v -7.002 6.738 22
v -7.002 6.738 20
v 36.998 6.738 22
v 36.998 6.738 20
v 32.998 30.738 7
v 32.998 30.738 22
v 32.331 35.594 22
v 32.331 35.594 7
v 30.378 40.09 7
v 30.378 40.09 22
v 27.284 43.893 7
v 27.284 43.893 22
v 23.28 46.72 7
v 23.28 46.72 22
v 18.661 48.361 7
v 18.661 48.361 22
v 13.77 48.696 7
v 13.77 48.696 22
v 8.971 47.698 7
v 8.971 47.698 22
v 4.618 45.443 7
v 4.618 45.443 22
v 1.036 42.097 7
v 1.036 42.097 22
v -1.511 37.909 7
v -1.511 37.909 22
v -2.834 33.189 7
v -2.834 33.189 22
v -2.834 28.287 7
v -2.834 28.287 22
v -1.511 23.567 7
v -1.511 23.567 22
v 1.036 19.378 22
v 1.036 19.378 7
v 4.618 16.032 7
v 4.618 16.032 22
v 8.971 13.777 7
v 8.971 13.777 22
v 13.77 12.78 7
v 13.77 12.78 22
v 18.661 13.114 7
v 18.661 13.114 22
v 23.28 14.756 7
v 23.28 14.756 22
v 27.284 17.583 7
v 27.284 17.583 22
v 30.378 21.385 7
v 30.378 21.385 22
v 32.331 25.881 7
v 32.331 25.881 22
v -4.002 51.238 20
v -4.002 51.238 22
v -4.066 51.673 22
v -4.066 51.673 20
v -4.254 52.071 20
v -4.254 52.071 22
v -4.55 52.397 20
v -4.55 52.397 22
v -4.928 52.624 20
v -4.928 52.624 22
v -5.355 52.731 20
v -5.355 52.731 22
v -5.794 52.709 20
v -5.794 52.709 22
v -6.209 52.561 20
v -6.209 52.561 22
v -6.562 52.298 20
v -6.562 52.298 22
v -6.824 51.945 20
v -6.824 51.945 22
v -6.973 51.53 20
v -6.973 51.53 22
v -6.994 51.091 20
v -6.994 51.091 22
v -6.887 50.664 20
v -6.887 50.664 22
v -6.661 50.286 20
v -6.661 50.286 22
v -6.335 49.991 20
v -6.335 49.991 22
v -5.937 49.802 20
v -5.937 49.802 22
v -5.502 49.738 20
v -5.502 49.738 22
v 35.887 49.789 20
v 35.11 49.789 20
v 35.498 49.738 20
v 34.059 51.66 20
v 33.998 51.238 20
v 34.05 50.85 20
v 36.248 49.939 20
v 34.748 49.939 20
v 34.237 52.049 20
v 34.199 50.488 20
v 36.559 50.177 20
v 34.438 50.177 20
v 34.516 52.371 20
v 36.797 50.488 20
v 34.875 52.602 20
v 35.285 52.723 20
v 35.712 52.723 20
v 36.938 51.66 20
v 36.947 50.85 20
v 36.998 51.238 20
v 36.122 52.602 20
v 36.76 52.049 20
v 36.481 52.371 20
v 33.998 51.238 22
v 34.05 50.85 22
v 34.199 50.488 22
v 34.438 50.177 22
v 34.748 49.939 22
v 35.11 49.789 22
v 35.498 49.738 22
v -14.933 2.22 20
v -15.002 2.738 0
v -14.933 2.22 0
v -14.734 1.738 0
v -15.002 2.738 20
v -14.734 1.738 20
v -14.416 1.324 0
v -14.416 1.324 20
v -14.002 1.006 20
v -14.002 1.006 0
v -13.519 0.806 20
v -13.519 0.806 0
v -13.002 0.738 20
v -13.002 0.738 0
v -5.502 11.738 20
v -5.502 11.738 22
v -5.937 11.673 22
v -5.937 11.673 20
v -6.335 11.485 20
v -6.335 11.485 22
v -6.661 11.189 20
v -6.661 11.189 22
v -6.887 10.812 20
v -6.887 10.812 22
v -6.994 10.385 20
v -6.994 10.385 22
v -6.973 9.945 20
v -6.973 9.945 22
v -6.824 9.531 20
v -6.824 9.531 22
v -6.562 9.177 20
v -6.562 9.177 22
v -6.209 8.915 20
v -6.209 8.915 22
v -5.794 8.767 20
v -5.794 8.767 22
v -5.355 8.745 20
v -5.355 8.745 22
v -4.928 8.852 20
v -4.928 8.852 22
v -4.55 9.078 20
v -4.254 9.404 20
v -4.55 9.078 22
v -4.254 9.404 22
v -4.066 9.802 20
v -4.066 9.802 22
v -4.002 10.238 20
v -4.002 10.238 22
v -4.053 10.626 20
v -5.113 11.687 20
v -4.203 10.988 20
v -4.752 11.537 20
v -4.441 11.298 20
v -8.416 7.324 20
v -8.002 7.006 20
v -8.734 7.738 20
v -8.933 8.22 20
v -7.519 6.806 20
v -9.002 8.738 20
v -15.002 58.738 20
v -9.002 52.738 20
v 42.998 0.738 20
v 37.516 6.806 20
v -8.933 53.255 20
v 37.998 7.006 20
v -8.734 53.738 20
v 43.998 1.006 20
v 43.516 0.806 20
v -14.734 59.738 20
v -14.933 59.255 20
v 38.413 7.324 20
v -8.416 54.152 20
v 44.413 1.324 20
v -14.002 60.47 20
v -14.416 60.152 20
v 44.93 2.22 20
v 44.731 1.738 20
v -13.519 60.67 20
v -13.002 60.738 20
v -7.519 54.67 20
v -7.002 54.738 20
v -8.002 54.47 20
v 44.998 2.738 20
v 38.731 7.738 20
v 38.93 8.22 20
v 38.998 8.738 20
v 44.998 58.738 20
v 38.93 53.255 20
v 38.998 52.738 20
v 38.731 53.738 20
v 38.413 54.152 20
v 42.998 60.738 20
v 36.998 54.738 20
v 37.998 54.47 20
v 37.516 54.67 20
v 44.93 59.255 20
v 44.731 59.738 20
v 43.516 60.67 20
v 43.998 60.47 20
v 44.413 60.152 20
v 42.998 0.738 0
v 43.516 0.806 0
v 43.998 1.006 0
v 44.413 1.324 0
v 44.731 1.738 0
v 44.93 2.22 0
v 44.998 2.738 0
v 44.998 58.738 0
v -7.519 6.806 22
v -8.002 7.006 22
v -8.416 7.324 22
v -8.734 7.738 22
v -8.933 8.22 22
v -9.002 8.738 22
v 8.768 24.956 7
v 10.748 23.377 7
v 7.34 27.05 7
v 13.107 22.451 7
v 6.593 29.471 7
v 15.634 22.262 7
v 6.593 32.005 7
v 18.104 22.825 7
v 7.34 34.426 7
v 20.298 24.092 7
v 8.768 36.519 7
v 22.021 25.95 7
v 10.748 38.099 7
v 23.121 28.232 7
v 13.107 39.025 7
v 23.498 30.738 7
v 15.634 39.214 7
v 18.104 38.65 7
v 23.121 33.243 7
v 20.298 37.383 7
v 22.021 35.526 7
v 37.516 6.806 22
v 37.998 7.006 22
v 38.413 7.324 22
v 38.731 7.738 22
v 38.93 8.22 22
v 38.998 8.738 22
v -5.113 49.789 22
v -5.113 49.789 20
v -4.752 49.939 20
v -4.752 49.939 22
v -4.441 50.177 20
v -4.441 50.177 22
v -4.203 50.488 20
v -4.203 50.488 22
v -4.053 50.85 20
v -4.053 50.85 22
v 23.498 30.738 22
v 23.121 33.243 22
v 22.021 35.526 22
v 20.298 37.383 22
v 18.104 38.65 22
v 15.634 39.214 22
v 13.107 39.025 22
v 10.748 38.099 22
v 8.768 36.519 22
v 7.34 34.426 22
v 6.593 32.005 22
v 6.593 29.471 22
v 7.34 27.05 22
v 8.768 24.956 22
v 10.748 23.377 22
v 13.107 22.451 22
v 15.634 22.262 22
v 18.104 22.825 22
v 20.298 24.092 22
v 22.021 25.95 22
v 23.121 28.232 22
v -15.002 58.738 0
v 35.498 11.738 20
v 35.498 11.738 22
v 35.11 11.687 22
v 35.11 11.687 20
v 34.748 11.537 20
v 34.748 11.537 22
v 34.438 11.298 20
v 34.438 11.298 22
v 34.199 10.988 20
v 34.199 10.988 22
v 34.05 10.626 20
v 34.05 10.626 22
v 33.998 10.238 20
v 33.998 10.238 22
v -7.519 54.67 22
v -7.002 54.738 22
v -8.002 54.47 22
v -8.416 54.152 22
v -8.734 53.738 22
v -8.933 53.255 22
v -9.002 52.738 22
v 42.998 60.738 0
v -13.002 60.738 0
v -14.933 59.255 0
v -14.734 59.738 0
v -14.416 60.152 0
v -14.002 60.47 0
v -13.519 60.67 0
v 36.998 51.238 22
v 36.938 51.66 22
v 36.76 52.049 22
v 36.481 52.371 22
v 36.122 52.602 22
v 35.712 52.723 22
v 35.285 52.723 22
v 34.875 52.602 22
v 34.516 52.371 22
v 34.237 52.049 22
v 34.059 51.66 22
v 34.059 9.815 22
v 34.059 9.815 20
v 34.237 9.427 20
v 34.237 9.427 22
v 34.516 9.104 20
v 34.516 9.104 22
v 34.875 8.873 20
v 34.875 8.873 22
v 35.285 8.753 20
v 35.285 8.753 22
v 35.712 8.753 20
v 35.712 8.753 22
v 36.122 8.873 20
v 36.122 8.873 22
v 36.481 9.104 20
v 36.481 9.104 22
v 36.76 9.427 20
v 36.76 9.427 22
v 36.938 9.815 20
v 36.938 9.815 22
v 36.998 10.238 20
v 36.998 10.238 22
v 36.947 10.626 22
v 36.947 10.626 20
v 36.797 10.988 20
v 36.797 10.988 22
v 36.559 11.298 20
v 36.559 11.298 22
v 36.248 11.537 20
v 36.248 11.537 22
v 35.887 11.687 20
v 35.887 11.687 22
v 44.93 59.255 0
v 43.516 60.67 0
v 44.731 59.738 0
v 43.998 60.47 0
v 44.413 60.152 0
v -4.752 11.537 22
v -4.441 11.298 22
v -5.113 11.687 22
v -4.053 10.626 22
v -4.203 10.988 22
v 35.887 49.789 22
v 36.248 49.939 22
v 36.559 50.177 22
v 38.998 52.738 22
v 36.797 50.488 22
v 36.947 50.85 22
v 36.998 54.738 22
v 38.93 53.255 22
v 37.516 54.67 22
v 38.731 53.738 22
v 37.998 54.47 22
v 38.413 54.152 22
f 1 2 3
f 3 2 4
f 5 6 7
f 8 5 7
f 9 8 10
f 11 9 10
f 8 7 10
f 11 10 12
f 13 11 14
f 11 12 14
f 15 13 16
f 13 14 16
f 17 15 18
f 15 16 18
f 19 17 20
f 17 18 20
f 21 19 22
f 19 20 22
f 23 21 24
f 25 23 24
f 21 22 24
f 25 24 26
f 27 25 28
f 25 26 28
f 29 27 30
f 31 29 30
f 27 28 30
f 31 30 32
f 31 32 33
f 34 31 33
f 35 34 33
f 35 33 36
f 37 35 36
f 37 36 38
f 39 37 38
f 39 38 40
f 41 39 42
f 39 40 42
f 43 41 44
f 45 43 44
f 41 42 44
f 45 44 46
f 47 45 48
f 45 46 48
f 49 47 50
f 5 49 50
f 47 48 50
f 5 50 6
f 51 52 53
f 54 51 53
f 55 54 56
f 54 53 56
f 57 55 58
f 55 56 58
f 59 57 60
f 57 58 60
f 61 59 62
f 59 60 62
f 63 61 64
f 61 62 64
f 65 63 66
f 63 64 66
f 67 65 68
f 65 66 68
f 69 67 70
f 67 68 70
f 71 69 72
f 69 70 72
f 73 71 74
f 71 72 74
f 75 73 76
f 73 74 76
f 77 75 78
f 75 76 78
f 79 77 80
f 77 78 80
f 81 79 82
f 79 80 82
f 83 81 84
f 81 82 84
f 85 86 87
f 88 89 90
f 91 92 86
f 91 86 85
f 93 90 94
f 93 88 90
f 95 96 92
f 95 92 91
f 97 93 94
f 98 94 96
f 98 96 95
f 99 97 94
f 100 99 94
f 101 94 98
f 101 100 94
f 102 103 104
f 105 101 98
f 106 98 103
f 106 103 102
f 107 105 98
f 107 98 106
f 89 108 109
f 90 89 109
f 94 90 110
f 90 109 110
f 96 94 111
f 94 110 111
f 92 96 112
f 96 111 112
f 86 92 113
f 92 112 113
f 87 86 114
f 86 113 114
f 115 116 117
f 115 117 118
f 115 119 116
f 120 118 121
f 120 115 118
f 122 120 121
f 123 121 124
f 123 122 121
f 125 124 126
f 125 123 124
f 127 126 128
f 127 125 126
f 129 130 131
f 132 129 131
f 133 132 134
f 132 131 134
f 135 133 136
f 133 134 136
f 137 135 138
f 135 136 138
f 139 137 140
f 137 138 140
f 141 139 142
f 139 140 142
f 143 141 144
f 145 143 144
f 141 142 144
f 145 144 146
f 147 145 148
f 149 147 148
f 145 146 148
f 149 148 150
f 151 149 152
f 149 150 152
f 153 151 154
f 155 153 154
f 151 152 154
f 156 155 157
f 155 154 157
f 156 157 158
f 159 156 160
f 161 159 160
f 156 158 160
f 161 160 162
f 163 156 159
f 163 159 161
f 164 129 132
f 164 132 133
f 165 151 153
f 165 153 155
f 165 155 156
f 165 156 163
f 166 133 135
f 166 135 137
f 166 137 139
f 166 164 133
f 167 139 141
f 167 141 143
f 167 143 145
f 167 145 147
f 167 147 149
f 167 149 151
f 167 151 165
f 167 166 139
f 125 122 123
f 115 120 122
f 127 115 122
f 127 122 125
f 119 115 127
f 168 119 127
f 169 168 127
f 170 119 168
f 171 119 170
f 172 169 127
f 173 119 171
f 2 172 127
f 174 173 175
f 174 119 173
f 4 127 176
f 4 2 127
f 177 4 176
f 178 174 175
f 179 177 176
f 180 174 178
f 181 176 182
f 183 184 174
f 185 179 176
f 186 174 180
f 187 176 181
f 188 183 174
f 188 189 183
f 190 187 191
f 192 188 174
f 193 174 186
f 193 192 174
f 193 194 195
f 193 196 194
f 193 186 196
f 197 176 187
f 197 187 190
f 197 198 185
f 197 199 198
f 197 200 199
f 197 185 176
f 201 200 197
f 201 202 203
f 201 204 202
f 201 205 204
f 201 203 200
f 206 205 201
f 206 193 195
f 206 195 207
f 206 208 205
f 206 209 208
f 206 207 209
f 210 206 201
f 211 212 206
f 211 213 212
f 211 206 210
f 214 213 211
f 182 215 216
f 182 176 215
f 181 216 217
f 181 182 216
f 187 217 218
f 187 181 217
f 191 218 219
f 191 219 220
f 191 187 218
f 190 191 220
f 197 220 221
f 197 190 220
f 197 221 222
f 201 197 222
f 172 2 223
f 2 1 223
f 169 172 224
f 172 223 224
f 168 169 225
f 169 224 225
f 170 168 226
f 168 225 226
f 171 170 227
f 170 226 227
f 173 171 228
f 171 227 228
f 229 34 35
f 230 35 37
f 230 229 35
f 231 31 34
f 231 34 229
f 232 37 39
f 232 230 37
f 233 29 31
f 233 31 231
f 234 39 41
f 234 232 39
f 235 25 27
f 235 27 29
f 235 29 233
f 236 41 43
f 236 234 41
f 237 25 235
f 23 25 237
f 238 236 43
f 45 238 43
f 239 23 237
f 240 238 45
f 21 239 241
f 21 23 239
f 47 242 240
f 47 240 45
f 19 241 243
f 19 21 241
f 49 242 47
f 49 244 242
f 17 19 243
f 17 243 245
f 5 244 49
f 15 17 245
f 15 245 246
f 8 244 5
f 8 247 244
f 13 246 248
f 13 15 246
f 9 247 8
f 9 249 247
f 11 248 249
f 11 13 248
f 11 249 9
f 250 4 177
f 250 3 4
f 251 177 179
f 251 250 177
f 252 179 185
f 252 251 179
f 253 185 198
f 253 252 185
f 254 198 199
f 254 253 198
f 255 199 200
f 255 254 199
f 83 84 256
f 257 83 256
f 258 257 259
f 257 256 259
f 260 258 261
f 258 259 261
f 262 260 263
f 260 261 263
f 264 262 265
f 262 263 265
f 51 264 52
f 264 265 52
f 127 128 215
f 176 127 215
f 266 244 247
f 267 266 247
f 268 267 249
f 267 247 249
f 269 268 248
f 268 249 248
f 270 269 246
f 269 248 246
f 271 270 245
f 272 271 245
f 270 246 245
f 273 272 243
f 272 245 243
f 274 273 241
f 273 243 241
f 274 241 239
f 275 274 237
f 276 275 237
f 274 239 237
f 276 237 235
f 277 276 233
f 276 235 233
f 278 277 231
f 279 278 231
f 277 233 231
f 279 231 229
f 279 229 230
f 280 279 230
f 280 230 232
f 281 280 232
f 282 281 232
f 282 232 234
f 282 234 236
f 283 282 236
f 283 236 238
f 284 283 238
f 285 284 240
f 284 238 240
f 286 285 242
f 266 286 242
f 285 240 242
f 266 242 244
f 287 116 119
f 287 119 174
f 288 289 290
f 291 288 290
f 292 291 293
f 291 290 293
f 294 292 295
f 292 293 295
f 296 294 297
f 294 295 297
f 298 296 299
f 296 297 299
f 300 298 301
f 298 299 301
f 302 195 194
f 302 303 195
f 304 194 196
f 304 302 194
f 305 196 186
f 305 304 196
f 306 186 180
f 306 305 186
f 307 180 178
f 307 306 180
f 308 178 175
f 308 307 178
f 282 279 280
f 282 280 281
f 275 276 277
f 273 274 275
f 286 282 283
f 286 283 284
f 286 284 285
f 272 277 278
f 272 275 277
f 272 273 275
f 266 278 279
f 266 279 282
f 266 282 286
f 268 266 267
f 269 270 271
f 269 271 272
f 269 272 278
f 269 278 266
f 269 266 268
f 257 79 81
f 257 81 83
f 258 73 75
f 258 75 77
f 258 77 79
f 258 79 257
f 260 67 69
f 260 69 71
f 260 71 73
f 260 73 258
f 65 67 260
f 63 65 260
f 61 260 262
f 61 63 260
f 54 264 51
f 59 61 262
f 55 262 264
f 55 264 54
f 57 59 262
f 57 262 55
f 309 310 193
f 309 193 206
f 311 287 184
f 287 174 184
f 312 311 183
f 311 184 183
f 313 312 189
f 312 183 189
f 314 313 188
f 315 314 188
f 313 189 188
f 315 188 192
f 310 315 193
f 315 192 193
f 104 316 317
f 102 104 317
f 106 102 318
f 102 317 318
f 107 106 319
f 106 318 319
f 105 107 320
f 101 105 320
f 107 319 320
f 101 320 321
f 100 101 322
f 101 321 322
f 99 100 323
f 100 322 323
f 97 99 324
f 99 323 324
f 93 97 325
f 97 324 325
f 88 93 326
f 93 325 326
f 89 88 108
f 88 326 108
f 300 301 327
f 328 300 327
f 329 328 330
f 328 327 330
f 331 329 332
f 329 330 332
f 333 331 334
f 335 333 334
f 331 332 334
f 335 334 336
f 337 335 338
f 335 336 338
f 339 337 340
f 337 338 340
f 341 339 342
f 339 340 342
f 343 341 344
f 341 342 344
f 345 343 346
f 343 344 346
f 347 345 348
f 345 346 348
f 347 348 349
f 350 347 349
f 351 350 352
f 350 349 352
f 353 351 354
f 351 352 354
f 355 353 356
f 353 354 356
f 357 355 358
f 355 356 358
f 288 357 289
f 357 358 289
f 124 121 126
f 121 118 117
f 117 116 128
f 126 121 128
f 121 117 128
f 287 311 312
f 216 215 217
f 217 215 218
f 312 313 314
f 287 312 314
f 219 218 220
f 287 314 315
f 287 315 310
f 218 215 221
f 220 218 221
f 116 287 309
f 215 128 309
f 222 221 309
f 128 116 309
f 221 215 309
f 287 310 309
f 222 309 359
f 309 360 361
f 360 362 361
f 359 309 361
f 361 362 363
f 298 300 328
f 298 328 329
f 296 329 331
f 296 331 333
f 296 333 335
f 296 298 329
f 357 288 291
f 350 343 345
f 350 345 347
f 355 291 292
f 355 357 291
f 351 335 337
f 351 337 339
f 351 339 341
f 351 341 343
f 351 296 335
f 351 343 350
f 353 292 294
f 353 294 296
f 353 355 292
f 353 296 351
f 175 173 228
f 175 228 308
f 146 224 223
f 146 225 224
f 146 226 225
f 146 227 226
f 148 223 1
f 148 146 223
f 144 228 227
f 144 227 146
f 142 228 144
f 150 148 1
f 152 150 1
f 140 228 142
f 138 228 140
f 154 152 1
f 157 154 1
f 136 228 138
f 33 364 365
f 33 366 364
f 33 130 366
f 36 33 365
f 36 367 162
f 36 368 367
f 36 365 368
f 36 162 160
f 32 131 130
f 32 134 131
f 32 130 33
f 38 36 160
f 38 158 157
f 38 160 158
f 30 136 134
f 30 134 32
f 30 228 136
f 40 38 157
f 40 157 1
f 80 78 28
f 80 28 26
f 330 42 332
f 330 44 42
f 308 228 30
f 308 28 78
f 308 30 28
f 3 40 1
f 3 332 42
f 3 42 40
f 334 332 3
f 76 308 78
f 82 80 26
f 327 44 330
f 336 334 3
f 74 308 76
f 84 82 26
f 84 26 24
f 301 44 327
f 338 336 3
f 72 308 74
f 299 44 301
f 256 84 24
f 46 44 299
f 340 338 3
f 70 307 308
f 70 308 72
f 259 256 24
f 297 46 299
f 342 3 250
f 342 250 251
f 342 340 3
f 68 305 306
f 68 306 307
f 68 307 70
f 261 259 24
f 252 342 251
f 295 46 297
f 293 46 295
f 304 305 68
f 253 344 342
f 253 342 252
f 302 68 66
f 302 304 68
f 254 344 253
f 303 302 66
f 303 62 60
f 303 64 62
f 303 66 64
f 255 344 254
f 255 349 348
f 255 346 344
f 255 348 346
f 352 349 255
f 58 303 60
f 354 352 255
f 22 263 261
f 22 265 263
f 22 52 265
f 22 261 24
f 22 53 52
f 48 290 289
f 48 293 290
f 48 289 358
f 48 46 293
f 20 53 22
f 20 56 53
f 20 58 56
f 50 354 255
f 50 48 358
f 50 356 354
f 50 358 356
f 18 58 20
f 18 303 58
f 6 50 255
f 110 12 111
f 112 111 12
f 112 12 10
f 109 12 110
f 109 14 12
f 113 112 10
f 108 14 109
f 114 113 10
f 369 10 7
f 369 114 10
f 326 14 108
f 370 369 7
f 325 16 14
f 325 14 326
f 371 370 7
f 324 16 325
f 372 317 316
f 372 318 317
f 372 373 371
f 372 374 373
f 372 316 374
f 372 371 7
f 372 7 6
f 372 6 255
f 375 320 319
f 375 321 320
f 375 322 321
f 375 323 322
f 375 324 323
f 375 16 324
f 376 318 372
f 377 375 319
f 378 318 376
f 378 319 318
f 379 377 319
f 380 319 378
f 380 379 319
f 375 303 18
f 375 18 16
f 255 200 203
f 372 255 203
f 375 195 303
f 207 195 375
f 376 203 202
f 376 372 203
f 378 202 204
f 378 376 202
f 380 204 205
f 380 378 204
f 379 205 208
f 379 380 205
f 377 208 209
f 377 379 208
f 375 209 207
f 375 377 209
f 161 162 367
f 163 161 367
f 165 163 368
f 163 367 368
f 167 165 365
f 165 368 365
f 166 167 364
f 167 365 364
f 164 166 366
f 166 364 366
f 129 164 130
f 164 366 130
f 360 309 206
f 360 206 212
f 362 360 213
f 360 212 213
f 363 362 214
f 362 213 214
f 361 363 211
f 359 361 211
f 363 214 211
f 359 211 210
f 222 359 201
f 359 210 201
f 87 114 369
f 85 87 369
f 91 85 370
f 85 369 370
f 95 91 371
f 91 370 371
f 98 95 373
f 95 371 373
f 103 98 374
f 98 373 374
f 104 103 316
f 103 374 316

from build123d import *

# Parameters (mm, degrees)
F0_W     = 60
F0_H     = 60
F1_DEPTH = 20
F2_W     = 48
F2_H     = 48
F3_DEPTH = 2
F5_DEPTH = 2
F6_R     = 18
F7_DEPTH = 15
F8_R     = 8.5
F9_DEPTH = 15
F10_R    = 2


with BuildPart() as f1:
    # F0 (on Top) → F1 (new body)
    with BuildSketch(Plane.XY):
        with Locations((14.998458, 30.737774)):
            Rectangle(F0_W, F0_H)
    extrude(amount=F1_DEPTH)

    # F2 (on face) → F3 (join)
    with BuildSketch(Plane.XY.offset(20)):
        with Locations((14.998458, 30.737774)):
            Rectangle(F2_W, F2_H)
    extrude(amount=F3_DEPTH)

    # F4 (on face) → F5 (cut)
    with BuildSketch(Plane.XY.offset(22)):
        with BuildLine():
            Line((-5.501542, 49.737774), (-5.501542, 51.237774))
            Line((-5.501542, 51.237774), (-4.001542, 51.237774))
            ThreePointArc((-4.001542, 51.237774), (-6.562202, 52.298434), (-5.501542, 49.737774))
        make_face()
        with BuildLine():
            Line((-4.001542, 51.237774), (-5.501542, 51.237774))
            Line((-5.501542, 51.237774), (-5.501542, 49.737774))
            ThreePointArc((-5.501542, 49.737774), (-4.440882, 50.177114), (-4.001542, 51.237774))
        make_face()
        with BuildLine():
            Line((35.498458, 51.237774), (33.998458, 51.237774))
            ThreePointArc((33.998458, 51.237774), (34.437798, 50.177114), (35.498458, 49.737774))
            Line((35.498458, 49.737774), (35.498458, 51.237774))
        make_face()
        with BuildLine():
            ThreePointArc((35.498458, 11.737774), (34.437798, 11.298434), (33.998458, 10.237774))
            Line((33.998458, 10.237774), (35.498458, 10.237774))
            Line((35.498458, 10.237774), (35.498458, 11.737774))
        make_face()
        with BuildLine():
            ThreePointArc((-4.001542, 10.237774), (-4.440882, 11.298434), (-5.501542, 11.737774))
            Line((-5.501542, 11.737774), (-5.501542, 10.237774))
            Line((-5.501542, 10.237774), (-4.001542, 10.237774))
        make_face()
        with BuildLine():
            Line((-5.501542, 10.237774), (-5.501542, 11.737774))
            ThreePointArc((-5.501542, 11.737774), (-6.562202, 9.177114), (-4.001542, 10.237774))
            Line((-4.001542, 10.237774), (-5.501542, 10.237774))
        make_face()
        with BuildLine():
            Line((35.498458, 10.237774), (33.998458, 10.237774))
            ThreePointArc((33.998458, 10.237774), (35.498458, 8.737774), (36.998458, 10.237774))
            ThreePointArc((36.998458, 10.237774), (36.559118, 11.298434), (35.498458, 11.737774))
            Line((35.498458, 11.737774), (35.498458, 10.237774))
        make_face()
        with BuildLine():
            ThreePointArc((36.998458, 51.237774), (35.498458, 52.737774), (33.998458, 51.237774))
            Line((33.998458, 51.237774), (35.498458, 51.237774))
            Line((35.498458, 51.237774), (35.498458, 49.737774))
            ThreePointArc((35.498458, 49.737774), (36.559118, 50.177114), (36.998458, 51.237774))
        make_face()
    extrude(amount=-F5_DEPTH, mode=Mode.SUBTRACT)

    # F6 (on face) → F7 (cut)
    with BuildSketch(Plane.XY.offset(22)):
        with Locations((14.998458, 30.737774)):
            Circle(F6_R)
    extrude(amount=-F7_DEPTH, mode=Mode.SUBTRACT)

    # F8 (on face) → F9 (join)
    with BuildSketch(Plane.XY.offset(7)):
        with Locations((14.998458, 30.737774)):
            Circle(F8_R)
    extrude(amount=F9_DEPTH)

    # F10
    f10_edges = [f1.edges().sort_by_distance(p)[0] for p in [
        (44.998458, 60.737774, 10),
        (44.998458, 0.737774, 10),
        (-15.001542, 0.737774, 10),
        (-15.001542, 60.737774, 10),
        (-9.001542, 54.737774, 21),
        (-9.001542, 6.737774, 21),
        (38.998458, 6.737774, 21),
        (38.998458, 54.737774, 21),
    ]]
    fillet(f10_edges, radius=F10_R)


solid = f1.part
